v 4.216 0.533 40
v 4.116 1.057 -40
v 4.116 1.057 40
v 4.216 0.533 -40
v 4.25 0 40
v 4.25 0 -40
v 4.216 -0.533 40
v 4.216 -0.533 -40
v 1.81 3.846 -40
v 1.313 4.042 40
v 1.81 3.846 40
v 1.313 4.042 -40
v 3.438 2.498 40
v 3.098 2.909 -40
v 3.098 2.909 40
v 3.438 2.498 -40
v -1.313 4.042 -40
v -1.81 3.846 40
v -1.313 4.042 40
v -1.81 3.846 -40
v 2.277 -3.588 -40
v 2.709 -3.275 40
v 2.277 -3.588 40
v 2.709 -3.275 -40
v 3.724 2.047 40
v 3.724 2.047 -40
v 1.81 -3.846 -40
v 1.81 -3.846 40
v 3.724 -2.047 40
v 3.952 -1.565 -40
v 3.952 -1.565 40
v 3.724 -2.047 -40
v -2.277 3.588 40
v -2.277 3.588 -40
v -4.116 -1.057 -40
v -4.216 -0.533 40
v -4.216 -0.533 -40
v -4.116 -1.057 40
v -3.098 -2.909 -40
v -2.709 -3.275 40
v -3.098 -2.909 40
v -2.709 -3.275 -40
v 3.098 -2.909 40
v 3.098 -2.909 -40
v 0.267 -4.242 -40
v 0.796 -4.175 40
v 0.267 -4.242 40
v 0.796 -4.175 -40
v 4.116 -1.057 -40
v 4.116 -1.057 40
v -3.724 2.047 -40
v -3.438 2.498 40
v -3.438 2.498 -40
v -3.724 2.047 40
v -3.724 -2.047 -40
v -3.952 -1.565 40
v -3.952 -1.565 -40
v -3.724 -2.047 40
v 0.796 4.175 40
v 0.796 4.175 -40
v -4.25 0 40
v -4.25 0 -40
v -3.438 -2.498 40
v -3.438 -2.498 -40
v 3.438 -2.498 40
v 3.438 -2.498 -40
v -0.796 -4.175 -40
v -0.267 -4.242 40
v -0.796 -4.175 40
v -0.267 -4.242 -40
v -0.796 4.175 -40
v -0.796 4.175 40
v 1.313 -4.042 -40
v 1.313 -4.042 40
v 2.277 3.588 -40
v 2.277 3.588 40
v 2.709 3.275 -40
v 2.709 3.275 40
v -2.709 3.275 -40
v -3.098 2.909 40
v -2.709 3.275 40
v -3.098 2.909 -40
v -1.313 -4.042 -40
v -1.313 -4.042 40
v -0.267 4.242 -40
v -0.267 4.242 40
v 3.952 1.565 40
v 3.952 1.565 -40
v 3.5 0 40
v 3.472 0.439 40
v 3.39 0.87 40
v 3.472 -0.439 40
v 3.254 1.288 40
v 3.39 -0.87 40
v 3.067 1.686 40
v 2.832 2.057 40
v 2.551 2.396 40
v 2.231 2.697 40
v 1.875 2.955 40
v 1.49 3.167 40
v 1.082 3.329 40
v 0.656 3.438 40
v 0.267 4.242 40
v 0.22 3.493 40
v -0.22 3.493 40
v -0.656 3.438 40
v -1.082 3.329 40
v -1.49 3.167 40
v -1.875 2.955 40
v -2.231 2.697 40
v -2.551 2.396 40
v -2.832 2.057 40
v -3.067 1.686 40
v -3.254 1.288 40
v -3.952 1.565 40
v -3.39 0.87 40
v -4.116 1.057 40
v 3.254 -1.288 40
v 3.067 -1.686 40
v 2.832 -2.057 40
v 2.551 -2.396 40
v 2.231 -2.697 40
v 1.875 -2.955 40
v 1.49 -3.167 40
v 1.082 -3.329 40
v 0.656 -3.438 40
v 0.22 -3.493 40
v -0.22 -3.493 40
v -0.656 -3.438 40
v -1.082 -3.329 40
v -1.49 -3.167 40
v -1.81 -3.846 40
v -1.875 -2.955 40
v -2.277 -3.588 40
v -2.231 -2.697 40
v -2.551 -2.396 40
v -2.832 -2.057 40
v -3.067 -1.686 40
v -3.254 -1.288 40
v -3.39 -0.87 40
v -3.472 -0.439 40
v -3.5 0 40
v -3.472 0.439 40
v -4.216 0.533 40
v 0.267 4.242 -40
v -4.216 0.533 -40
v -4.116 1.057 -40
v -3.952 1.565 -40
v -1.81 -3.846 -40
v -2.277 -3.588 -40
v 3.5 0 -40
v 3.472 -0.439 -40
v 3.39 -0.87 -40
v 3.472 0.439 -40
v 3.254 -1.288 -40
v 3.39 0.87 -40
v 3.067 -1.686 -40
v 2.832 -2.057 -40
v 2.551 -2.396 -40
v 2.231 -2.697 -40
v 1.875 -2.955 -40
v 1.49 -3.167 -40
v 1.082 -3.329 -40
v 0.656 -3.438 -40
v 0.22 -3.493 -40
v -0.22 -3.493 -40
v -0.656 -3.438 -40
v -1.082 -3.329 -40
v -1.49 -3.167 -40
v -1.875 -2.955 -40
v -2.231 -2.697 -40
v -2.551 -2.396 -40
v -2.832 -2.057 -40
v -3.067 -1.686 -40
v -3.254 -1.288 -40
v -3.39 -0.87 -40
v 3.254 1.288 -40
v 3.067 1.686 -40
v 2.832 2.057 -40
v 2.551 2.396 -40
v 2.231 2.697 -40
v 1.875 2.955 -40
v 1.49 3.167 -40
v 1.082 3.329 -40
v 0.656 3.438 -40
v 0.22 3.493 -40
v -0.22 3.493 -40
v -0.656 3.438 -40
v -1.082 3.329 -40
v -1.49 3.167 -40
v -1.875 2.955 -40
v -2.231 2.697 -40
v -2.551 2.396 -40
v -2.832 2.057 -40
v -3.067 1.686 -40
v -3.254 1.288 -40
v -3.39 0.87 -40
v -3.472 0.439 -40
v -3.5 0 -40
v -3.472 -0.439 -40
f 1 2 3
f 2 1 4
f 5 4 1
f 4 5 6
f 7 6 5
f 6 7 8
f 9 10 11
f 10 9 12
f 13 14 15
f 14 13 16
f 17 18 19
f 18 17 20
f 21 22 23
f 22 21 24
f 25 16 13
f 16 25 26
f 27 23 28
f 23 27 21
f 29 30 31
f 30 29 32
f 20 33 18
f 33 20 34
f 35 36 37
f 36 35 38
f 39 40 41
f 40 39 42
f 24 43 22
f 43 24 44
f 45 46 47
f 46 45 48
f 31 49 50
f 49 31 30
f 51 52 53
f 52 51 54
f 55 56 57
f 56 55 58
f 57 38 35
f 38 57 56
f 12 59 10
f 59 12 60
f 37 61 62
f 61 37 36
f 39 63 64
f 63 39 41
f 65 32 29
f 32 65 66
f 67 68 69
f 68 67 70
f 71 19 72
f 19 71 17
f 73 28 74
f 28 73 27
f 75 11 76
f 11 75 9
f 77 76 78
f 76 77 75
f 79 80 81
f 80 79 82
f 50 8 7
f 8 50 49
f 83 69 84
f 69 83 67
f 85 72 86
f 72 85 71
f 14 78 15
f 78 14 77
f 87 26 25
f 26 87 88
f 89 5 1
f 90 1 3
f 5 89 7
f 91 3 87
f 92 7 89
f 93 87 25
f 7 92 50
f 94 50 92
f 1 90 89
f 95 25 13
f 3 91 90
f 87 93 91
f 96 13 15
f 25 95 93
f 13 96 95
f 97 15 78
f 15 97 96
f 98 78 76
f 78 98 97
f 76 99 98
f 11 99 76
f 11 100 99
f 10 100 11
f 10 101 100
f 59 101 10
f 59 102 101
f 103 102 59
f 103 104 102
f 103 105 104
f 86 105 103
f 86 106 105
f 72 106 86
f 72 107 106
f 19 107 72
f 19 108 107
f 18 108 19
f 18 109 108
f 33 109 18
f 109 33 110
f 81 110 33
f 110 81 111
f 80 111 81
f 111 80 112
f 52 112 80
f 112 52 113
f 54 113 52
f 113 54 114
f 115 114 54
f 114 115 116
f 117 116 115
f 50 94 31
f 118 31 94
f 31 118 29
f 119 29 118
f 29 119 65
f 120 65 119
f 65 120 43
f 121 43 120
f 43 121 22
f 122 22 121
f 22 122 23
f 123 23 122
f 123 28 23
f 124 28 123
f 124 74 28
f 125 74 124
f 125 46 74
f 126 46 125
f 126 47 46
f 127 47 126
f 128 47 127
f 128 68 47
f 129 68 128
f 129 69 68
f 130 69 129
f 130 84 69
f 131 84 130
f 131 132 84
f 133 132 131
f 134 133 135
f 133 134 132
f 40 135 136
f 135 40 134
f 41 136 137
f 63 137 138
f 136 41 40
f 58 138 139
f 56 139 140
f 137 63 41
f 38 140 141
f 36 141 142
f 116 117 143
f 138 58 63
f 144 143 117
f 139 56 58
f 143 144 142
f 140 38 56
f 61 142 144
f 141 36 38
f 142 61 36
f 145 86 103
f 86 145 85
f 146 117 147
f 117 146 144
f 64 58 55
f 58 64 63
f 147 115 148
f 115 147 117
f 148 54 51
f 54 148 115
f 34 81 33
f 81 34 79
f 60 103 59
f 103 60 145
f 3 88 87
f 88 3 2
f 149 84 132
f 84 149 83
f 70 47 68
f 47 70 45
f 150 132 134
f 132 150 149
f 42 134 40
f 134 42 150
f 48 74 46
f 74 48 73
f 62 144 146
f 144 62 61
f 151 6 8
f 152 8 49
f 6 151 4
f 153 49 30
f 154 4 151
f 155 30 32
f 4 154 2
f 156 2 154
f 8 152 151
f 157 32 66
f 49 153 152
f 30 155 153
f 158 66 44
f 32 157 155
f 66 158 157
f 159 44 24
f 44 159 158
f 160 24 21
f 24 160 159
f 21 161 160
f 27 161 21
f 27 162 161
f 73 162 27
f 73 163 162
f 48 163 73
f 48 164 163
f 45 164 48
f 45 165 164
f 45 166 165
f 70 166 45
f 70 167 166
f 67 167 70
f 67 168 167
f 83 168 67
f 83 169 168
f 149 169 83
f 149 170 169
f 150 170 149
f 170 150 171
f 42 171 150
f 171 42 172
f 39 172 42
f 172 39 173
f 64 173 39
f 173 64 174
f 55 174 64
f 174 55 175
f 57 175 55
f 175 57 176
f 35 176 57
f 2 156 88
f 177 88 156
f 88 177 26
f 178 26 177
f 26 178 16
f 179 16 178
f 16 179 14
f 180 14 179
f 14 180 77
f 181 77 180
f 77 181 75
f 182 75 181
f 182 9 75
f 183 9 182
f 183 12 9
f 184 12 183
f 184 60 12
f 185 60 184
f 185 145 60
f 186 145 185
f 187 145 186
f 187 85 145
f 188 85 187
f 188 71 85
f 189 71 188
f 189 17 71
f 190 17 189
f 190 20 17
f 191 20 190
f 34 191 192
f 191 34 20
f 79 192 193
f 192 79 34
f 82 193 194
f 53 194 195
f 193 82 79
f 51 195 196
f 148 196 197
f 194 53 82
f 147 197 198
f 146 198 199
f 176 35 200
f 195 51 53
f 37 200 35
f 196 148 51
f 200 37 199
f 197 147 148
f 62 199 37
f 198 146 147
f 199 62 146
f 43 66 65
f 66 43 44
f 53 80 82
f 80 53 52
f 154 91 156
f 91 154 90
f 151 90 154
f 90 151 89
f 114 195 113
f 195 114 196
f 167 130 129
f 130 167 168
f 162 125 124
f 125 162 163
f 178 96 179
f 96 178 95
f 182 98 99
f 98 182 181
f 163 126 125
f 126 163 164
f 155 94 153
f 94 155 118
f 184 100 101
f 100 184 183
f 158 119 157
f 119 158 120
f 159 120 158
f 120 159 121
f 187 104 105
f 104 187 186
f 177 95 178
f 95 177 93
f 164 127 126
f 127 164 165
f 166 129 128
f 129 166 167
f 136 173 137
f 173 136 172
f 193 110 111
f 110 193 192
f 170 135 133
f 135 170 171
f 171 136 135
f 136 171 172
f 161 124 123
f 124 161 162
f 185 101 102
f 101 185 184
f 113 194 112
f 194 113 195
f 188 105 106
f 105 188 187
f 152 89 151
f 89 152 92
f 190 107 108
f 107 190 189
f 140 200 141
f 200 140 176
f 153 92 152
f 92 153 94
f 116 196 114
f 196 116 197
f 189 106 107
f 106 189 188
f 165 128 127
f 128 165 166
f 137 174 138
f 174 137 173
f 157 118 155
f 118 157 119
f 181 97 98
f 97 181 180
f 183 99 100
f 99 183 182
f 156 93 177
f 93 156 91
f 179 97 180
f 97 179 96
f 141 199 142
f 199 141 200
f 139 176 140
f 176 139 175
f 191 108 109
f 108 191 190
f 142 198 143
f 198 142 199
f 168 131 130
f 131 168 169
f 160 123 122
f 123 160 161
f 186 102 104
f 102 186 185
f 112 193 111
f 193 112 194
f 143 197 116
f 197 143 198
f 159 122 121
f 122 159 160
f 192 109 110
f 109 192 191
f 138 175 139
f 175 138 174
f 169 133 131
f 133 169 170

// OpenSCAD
$fn = 50;


difference() {
	union() {
		translate(v = [0, 0, -40.0000000000]) {
			cylinder(h = 80, r = 4.2500000000);
		}
	}
	union() {
		translate(v = [0, 0, -100.0000000000]) {
			cylinder(h = 200, r = 3.5000000000);
		}
	}
}
